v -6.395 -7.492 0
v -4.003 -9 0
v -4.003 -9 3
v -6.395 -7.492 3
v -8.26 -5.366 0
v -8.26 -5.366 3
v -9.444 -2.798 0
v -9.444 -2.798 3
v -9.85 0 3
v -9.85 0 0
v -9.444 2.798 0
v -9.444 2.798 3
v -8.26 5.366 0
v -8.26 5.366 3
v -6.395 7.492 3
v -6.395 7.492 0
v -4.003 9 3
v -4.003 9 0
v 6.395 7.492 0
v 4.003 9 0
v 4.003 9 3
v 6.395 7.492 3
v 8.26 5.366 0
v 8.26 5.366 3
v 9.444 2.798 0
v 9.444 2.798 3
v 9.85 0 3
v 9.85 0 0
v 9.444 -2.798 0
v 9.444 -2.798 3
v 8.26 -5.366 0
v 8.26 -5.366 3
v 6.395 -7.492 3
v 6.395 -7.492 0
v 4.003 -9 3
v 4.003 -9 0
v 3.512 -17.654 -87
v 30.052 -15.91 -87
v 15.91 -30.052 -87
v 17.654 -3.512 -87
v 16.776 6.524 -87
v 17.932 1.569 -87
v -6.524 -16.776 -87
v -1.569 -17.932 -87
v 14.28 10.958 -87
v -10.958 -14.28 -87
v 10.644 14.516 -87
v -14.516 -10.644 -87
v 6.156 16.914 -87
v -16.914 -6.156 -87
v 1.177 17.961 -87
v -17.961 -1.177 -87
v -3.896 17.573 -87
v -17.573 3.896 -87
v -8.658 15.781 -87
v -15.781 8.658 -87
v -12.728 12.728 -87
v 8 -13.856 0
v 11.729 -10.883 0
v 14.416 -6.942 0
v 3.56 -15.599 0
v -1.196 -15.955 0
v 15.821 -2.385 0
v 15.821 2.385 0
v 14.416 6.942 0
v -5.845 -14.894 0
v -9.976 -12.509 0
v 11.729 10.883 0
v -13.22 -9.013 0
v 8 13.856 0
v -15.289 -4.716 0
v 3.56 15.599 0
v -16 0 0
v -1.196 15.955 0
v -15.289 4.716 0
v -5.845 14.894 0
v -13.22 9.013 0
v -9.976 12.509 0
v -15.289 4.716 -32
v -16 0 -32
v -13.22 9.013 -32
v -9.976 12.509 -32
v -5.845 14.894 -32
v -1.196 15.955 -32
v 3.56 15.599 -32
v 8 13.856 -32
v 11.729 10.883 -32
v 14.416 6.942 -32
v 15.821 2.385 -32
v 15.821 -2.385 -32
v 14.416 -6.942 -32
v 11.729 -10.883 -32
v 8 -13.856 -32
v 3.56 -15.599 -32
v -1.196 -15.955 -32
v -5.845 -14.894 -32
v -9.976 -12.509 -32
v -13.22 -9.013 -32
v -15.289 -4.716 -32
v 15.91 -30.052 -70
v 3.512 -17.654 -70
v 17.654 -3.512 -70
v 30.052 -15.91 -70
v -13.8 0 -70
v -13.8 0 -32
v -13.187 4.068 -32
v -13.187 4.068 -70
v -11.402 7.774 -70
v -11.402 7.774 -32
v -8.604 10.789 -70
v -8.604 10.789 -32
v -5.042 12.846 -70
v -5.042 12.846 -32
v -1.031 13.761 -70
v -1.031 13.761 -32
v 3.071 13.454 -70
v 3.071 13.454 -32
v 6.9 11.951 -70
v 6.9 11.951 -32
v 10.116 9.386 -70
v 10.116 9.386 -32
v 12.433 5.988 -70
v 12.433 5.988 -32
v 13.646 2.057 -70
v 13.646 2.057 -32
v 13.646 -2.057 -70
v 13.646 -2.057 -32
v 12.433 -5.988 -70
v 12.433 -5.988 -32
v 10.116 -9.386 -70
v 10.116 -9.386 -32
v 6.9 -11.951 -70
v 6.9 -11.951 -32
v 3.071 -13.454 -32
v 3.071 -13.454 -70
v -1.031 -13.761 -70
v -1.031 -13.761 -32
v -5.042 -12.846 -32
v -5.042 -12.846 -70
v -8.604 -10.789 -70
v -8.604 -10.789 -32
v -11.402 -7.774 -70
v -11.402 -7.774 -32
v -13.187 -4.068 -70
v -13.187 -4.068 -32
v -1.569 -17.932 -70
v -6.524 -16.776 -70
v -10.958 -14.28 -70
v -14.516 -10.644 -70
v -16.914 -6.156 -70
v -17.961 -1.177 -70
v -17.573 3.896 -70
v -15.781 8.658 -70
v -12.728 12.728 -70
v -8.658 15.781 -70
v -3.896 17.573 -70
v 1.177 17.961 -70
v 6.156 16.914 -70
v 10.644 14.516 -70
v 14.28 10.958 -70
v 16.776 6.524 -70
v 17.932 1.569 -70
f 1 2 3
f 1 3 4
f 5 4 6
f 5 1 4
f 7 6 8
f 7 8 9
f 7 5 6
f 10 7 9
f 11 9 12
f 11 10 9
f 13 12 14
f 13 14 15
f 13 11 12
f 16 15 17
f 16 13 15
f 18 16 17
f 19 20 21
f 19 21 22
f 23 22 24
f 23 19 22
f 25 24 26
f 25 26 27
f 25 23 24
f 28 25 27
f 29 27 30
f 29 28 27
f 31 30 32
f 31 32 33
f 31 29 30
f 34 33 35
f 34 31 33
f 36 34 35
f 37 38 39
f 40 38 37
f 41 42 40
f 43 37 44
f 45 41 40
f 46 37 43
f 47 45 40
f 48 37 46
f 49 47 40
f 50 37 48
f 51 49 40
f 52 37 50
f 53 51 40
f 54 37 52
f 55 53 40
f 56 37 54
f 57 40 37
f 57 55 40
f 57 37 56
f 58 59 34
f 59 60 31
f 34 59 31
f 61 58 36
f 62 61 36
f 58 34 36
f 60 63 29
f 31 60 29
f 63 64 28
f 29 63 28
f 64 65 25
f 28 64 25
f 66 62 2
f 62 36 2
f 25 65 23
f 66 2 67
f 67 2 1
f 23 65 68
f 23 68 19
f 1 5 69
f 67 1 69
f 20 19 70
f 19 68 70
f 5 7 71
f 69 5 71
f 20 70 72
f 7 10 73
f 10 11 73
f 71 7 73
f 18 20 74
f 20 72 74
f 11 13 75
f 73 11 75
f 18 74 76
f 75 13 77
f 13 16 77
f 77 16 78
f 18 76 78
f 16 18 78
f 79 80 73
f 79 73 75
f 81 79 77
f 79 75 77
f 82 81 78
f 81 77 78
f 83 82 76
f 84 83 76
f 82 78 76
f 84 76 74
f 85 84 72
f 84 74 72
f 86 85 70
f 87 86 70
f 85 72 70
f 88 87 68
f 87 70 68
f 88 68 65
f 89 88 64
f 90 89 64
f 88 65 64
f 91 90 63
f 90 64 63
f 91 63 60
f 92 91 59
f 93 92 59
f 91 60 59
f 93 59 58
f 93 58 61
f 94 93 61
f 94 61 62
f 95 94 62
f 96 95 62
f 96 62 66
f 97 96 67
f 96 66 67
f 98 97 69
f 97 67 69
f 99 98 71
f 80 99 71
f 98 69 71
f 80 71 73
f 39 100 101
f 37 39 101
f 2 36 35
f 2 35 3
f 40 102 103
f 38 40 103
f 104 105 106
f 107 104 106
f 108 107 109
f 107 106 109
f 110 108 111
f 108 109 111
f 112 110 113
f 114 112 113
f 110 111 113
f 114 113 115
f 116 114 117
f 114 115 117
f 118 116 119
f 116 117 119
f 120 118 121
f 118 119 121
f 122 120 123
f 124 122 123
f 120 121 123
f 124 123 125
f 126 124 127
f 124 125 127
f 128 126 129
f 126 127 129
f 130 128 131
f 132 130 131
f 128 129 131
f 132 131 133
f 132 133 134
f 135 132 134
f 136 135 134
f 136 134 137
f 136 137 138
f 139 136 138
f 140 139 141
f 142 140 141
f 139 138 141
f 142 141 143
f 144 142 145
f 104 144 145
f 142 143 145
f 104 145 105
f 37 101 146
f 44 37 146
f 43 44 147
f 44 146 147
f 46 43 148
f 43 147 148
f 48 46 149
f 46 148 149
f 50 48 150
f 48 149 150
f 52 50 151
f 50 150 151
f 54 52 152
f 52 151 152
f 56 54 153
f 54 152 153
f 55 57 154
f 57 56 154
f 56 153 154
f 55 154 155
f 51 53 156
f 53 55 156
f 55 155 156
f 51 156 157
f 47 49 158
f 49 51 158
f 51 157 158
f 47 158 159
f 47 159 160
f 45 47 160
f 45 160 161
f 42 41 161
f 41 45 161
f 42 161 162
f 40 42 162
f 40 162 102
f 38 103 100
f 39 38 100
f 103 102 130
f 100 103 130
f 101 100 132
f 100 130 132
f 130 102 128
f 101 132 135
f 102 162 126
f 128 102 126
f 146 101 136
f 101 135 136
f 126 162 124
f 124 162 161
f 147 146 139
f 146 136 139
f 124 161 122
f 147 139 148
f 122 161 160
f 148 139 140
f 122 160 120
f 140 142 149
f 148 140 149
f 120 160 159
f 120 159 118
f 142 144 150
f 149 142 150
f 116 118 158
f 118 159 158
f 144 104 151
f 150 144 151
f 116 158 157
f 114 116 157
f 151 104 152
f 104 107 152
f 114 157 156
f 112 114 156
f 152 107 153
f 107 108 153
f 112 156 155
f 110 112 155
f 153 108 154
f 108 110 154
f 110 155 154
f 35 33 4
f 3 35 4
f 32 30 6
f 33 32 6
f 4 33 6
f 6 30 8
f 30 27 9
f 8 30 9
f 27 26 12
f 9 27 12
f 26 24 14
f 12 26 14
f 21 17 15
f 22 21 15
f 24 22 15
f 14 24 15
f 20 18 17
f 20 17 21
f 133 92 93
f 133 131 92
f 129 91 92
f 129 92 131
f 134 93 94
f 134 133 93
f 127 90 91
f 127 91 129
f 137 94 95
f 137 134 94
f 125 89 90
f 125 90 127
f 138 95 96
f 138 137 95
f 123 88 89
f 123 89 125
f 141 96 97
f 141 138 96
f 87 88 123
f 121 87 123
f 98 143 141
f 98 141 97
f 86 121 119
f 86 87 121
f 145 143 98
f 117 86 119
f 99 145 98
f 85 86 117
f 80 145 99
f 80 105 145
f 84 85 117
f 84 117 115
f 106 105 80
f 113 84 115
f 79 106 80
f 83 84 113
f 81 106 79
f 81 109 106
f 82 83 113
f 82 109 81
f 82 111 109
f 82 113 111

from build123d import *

# Parameters (mm, degrees)
BOSS_EXTRUDE1_DEPTH = 3
SKETCH2_R           = 16
BOSS_EXTRUDE2_DEPTH = 32
SKETCH3_R           = 13.8
BOSS_EXTRUDE3_DEPTH = 38
SKETCH4_R           = 18
SKETCH4_R_2         = 13.8
BOSS_EXTRUDE4_DEPTH = 17


with BuildPart() as part:
    # Sketch1 → Boss-Extrude1 (new body)
    with BuildSketch(Plane.XY):
        with BuildLine():
            Line((-4.002811512, 9), (4.002811512, 9))
            ThreePointArc((4.002811512, 9), (9.85, 0), (4.002811512, -9))
            Line((4.002811512, -9), (-4.002811512, -9))
            ThreePointArc((-4.002811512, -9), (-9.85, 0), (-4.002811512, 9))
        make_face()
    extrude(amount=BOSS_EXTRUDE1_DEPTH)

    # Sketch2 → Boss-Extrude2 (add)
    with BuildSketch(Plane(origin=(0, 0, 0), x_dir=(-1, 0, 0), z_dir=(0, 0, -1))):
        Circle(SKETCH2_R)
    extrude(amount=BOSS_EXTRUDE2_DEPTH)

    # Sketch3 → Boss-Extrude3 (add)
    with BuildSketch(Plane(origin=(0, 0, -32), x_dir=(-1, 0, 0), z_dir=(0, 0, -1))):
        Circle(SKETCH3_R)
    extrude(amount=BOSS_EXTRUDE3_DEPTH)

    # Sketch4 → Boss-Extrude4 (add)
    # profile 1 of 3: a face of its own
    with BuildSketch(Plane(origin=(0, 0, -70), x_dir=(-1, 0, 0), z_dir=(0, 0, -1))):
        Circle(SKETCH4_R)
        Circle(SKETCH4_R_2, mode=Mode.SUBTRACT)
    # profile 2 of 3: a face of its own
    with BuildSketch(Plane(origin=(0, 0, -70), x_dir=(-1, 0, 0), z_dir=(0, 0, -1))):
        Circle(SKETCH4_R_2)
    # profile 3 of 3: a face of its own
    with BuildSketch(Plane(origin=(0, 0, -70), x_dir=(-1, 0, 0), z_dir=(0, 0, -1))):
        with BuildLine():
            Line((-17.654073056, -3.511937432), (-30.0520382, -15.909902577))
            Line((-30.0520382, -15.909902577), (-15.909902577, -30.0520382))
            Line((-15.909902577, -30.0520382), (-3.511937432, -17.654073056))
            ThreePointArc((-3.511937432, -17.654073056), (-12.727922061, -12.727922061), (-17.654073056, -3.511937432))
        make_face()
    extrude(amount=BOSS_EXTRUDE4_DEPTH)


solid = part.part
